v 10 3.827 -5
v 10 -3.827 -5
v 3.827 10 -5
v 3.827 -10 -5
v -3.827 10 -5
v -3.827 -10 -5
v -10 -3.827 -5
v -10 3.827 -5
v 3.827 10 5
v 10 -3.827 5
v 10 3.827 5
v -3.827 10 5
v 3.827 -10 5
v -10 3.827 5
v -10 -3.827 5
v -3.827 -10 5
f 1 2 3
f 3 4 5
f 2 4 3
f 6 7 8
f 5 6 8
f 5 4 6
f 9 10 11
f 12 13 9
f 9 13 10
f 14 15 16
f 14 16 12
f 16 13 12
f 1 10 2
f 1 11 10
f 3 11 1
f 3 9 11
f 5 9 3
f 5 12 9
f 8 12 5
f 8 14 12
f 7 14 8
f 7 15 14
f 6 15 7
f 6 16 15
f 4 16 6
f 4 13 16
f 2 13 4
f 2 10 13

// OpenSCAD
// Created by Matthew Alexander Manuel 2016-03-09
// matt@mattmanuel.com http://www.mattmanuel.com
// The MIT License (MIT)
/* Copyright (c) 2016 Matthew Alexander Manuel

Permission is hereby granted, free of charge, to any person obtaining a copy of this software and associated documentation files (the "Software"), to deal in the Software without restriction, including without limitation the rights to use, copy, modify, merge, publish, distribute, sublicense, and/or sell copies of the Software, and to permit persons to whom the Software is furnished to do so, subject to the following conditions:

The above copyright notice and this permission notice shall be included in all copies or substantial portions of the Software.

THE SOFTWARE IS PROVIDED "AS IS", WITHOUT WARRANTY OF ANY KIND, EXPRESS OR IMPLIED, INCLUDING BUT NOT LIMITED TO THE WARRANTIES OF MERCHANTABILITY, FITNESS FOR A PARTICULAR PURPOSE AND NONINFRINGEMENT. IN NO EVENT SHALL THE AUTHORS OR COPYRIGHT HOLDERS BE LIABLE FOR ANY CLAIM, DAMAGES OR OTHER LIABILITY, WHETHER IN AN ACTION OF CONTRACT, TORT OR OTHERWISE, ARISING FROM, OUT OF OR IN CONNECTION WITH THE SOFTWARE OR THE USE OR OTHER DEALINGS IN THE SOFTWARE.
*/

// size is the XY plane size, height in Z
module octagon(scaleSize, extrudeHeight) {
    // circumscribed size -- circle radius touching points, not sides
    sin225 = sin(22.5); // pre-calculate to save CPU cycles a bit (probably not necessary, but a good practice)
//    cos30 = cos(30);
    scale([scaleSize,scaleSize,1]) linear_extrude(height = extrudeHeight, center = true) polygon(points = [ [1,sin225],[sin225,1],[-sin225,1],[-1,sin225],[-1,-sin225],[-sin225,-1],[sin225,-1],[1,-sin225]] );
        
}

octagon(10,10);
